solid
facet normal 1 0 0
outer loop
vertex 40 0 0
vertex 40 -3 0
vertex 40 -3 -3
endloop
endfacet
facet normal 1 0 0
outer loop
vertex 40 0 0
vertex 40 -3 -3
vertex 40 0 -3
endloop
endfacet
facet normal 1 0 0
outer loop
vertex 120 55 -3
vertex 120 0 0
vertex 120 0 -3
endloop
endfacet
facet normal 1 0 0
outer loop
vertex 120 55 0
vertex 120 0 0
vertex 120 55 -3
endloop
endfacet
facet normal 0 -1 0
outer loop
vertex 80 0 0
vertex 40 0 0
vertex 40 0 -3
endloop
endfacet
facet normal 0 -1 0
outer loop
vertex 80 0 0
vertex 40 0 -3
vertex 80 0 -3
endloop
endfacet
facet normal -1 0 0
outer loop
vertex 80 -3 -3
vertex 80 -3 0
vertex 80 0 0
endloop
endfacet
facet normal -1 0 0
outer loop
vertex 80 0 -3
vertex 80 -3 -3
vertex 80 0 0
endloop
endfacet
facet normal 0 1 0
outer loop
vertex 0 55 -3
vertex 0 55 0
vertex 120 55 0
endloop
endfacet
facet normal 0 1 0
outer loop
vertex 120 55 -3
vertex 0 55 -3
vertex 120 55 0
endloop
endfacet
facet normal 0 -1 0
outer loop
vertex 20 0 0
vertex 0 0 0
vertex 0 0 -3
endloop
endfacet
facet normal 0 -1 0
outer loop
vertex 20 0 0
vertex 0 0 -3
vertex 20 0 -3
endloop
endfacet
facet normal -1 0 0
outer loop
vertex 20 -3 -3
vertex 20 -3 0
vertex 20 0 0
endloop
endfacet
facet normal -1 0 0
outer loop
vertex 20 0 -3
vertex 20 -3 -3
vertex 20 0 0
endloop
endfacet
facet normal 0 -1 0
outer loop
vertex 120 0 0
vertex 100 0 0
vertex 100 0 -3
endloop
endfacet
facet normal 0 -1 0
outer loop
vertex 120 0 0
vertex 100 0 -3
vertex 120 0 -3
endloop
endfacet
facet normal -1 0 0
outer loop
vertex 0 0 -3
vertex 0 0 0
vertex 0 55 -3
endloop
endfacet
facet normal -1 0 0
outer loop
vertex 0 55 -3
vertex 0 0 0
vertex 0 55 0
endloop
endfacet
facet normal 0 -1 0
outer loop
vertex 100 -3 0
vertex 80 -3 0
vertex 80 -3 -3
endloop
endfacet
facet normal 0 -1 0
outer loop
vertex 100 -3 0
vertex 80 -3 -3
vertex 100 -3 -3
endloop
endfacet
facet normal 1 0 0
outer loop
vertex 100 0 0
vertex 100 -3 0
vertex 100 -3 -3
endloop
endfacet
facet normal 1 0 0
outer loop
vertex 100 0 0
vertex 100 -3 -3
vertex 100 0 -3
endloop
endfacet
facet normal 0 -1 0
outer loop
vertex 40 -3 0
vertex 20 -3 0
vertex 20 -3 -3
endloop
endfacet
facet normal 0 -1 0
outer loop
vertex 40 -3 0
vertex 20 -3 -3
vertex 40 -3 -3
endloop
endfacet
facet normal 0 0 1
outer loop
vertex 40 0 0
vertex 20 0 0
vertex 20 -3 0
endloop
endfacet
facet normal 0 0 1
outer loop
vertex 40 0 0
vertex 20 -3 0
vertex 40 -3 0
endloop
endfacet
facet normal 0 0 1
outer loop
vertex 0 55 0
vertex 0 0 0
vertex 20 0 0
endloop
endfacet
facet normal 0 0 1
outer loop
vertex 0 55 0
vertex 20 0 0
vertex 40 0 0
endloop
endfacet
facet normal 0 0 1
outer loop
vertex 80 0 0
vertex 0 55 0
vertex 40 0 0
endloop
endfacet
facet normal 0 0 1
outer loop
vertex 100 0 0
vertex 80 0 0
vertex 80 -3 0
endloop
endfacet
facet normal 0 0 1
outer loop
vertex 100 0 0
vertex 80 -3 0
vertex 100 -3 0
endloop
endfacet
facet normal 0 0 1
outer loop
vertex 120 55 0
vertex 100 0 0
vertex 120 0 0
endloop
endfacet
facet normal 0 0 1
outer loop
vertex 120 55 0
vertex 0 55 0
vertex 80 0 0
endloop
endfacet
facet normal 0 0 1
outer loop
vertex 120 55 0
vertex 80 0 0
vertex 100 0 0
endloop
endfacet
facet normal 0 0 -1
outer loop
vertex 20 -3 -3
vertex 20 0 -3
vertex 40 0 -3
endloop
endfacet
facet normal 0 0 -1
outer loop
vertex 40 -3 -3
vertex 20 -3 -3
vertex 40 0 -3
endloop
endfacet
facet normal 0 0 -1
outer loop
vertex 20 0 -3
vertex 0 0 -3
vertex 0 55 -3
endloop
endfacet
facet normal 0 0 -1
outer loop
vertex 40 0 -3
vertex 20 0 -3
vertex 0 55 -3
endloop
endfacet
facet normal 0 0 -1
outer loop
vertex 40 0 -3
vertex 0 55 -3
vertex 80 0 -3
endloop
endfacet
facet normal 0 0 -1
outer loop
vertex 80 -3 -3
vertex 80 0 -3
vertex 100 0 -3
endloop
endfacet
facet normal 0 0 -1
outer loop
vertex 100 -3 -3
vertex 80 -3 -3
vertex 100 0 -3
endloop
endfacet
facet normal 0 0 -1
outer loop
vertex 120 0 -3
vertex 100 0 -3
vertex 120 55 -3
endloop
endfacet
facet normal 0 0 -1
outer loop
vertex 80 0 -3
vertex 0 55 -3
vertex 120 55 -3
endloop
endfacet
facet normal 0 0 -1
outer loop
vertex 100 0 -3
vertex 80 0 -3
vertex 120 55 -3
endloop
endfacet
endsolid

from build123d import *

# Parameters (mm, degrees)
SKETCH1_W           = 120
SKETCH1_H           = 55
BOSS_EXTRUDE1_DEPTH = 3
SKETCH2_W           = 20
SKETCH2_H           = 3
BOSS_EXTRUDE2_DEPTH = 3


with BuildPart() as part:
    # Sketch1 → Boss-Extrude1 (new body)
    with BuildSketch(Plane.XY):
        with Locations((60, 27.5)):
            Rectangle(SKETCH1_W, SKETCH1_H)
    extrude(amount=-BOSS_EXTRUDE1_DEPTH)

    # Sketch2 → Boss-Extrude2 (add)
    with BuildSketch(Plane.XY):
        with Locations((30, -1.5)):
            Rectangle(SKETCH2_W, SKETCH2_H)
        with Locations((90, -1.5)):
            Rectangle(SKETCH2_W, SKETCH2_H)
    extrude(amount=-BOSS_EXTRUDE2_DEPTH)


solid = part.part
